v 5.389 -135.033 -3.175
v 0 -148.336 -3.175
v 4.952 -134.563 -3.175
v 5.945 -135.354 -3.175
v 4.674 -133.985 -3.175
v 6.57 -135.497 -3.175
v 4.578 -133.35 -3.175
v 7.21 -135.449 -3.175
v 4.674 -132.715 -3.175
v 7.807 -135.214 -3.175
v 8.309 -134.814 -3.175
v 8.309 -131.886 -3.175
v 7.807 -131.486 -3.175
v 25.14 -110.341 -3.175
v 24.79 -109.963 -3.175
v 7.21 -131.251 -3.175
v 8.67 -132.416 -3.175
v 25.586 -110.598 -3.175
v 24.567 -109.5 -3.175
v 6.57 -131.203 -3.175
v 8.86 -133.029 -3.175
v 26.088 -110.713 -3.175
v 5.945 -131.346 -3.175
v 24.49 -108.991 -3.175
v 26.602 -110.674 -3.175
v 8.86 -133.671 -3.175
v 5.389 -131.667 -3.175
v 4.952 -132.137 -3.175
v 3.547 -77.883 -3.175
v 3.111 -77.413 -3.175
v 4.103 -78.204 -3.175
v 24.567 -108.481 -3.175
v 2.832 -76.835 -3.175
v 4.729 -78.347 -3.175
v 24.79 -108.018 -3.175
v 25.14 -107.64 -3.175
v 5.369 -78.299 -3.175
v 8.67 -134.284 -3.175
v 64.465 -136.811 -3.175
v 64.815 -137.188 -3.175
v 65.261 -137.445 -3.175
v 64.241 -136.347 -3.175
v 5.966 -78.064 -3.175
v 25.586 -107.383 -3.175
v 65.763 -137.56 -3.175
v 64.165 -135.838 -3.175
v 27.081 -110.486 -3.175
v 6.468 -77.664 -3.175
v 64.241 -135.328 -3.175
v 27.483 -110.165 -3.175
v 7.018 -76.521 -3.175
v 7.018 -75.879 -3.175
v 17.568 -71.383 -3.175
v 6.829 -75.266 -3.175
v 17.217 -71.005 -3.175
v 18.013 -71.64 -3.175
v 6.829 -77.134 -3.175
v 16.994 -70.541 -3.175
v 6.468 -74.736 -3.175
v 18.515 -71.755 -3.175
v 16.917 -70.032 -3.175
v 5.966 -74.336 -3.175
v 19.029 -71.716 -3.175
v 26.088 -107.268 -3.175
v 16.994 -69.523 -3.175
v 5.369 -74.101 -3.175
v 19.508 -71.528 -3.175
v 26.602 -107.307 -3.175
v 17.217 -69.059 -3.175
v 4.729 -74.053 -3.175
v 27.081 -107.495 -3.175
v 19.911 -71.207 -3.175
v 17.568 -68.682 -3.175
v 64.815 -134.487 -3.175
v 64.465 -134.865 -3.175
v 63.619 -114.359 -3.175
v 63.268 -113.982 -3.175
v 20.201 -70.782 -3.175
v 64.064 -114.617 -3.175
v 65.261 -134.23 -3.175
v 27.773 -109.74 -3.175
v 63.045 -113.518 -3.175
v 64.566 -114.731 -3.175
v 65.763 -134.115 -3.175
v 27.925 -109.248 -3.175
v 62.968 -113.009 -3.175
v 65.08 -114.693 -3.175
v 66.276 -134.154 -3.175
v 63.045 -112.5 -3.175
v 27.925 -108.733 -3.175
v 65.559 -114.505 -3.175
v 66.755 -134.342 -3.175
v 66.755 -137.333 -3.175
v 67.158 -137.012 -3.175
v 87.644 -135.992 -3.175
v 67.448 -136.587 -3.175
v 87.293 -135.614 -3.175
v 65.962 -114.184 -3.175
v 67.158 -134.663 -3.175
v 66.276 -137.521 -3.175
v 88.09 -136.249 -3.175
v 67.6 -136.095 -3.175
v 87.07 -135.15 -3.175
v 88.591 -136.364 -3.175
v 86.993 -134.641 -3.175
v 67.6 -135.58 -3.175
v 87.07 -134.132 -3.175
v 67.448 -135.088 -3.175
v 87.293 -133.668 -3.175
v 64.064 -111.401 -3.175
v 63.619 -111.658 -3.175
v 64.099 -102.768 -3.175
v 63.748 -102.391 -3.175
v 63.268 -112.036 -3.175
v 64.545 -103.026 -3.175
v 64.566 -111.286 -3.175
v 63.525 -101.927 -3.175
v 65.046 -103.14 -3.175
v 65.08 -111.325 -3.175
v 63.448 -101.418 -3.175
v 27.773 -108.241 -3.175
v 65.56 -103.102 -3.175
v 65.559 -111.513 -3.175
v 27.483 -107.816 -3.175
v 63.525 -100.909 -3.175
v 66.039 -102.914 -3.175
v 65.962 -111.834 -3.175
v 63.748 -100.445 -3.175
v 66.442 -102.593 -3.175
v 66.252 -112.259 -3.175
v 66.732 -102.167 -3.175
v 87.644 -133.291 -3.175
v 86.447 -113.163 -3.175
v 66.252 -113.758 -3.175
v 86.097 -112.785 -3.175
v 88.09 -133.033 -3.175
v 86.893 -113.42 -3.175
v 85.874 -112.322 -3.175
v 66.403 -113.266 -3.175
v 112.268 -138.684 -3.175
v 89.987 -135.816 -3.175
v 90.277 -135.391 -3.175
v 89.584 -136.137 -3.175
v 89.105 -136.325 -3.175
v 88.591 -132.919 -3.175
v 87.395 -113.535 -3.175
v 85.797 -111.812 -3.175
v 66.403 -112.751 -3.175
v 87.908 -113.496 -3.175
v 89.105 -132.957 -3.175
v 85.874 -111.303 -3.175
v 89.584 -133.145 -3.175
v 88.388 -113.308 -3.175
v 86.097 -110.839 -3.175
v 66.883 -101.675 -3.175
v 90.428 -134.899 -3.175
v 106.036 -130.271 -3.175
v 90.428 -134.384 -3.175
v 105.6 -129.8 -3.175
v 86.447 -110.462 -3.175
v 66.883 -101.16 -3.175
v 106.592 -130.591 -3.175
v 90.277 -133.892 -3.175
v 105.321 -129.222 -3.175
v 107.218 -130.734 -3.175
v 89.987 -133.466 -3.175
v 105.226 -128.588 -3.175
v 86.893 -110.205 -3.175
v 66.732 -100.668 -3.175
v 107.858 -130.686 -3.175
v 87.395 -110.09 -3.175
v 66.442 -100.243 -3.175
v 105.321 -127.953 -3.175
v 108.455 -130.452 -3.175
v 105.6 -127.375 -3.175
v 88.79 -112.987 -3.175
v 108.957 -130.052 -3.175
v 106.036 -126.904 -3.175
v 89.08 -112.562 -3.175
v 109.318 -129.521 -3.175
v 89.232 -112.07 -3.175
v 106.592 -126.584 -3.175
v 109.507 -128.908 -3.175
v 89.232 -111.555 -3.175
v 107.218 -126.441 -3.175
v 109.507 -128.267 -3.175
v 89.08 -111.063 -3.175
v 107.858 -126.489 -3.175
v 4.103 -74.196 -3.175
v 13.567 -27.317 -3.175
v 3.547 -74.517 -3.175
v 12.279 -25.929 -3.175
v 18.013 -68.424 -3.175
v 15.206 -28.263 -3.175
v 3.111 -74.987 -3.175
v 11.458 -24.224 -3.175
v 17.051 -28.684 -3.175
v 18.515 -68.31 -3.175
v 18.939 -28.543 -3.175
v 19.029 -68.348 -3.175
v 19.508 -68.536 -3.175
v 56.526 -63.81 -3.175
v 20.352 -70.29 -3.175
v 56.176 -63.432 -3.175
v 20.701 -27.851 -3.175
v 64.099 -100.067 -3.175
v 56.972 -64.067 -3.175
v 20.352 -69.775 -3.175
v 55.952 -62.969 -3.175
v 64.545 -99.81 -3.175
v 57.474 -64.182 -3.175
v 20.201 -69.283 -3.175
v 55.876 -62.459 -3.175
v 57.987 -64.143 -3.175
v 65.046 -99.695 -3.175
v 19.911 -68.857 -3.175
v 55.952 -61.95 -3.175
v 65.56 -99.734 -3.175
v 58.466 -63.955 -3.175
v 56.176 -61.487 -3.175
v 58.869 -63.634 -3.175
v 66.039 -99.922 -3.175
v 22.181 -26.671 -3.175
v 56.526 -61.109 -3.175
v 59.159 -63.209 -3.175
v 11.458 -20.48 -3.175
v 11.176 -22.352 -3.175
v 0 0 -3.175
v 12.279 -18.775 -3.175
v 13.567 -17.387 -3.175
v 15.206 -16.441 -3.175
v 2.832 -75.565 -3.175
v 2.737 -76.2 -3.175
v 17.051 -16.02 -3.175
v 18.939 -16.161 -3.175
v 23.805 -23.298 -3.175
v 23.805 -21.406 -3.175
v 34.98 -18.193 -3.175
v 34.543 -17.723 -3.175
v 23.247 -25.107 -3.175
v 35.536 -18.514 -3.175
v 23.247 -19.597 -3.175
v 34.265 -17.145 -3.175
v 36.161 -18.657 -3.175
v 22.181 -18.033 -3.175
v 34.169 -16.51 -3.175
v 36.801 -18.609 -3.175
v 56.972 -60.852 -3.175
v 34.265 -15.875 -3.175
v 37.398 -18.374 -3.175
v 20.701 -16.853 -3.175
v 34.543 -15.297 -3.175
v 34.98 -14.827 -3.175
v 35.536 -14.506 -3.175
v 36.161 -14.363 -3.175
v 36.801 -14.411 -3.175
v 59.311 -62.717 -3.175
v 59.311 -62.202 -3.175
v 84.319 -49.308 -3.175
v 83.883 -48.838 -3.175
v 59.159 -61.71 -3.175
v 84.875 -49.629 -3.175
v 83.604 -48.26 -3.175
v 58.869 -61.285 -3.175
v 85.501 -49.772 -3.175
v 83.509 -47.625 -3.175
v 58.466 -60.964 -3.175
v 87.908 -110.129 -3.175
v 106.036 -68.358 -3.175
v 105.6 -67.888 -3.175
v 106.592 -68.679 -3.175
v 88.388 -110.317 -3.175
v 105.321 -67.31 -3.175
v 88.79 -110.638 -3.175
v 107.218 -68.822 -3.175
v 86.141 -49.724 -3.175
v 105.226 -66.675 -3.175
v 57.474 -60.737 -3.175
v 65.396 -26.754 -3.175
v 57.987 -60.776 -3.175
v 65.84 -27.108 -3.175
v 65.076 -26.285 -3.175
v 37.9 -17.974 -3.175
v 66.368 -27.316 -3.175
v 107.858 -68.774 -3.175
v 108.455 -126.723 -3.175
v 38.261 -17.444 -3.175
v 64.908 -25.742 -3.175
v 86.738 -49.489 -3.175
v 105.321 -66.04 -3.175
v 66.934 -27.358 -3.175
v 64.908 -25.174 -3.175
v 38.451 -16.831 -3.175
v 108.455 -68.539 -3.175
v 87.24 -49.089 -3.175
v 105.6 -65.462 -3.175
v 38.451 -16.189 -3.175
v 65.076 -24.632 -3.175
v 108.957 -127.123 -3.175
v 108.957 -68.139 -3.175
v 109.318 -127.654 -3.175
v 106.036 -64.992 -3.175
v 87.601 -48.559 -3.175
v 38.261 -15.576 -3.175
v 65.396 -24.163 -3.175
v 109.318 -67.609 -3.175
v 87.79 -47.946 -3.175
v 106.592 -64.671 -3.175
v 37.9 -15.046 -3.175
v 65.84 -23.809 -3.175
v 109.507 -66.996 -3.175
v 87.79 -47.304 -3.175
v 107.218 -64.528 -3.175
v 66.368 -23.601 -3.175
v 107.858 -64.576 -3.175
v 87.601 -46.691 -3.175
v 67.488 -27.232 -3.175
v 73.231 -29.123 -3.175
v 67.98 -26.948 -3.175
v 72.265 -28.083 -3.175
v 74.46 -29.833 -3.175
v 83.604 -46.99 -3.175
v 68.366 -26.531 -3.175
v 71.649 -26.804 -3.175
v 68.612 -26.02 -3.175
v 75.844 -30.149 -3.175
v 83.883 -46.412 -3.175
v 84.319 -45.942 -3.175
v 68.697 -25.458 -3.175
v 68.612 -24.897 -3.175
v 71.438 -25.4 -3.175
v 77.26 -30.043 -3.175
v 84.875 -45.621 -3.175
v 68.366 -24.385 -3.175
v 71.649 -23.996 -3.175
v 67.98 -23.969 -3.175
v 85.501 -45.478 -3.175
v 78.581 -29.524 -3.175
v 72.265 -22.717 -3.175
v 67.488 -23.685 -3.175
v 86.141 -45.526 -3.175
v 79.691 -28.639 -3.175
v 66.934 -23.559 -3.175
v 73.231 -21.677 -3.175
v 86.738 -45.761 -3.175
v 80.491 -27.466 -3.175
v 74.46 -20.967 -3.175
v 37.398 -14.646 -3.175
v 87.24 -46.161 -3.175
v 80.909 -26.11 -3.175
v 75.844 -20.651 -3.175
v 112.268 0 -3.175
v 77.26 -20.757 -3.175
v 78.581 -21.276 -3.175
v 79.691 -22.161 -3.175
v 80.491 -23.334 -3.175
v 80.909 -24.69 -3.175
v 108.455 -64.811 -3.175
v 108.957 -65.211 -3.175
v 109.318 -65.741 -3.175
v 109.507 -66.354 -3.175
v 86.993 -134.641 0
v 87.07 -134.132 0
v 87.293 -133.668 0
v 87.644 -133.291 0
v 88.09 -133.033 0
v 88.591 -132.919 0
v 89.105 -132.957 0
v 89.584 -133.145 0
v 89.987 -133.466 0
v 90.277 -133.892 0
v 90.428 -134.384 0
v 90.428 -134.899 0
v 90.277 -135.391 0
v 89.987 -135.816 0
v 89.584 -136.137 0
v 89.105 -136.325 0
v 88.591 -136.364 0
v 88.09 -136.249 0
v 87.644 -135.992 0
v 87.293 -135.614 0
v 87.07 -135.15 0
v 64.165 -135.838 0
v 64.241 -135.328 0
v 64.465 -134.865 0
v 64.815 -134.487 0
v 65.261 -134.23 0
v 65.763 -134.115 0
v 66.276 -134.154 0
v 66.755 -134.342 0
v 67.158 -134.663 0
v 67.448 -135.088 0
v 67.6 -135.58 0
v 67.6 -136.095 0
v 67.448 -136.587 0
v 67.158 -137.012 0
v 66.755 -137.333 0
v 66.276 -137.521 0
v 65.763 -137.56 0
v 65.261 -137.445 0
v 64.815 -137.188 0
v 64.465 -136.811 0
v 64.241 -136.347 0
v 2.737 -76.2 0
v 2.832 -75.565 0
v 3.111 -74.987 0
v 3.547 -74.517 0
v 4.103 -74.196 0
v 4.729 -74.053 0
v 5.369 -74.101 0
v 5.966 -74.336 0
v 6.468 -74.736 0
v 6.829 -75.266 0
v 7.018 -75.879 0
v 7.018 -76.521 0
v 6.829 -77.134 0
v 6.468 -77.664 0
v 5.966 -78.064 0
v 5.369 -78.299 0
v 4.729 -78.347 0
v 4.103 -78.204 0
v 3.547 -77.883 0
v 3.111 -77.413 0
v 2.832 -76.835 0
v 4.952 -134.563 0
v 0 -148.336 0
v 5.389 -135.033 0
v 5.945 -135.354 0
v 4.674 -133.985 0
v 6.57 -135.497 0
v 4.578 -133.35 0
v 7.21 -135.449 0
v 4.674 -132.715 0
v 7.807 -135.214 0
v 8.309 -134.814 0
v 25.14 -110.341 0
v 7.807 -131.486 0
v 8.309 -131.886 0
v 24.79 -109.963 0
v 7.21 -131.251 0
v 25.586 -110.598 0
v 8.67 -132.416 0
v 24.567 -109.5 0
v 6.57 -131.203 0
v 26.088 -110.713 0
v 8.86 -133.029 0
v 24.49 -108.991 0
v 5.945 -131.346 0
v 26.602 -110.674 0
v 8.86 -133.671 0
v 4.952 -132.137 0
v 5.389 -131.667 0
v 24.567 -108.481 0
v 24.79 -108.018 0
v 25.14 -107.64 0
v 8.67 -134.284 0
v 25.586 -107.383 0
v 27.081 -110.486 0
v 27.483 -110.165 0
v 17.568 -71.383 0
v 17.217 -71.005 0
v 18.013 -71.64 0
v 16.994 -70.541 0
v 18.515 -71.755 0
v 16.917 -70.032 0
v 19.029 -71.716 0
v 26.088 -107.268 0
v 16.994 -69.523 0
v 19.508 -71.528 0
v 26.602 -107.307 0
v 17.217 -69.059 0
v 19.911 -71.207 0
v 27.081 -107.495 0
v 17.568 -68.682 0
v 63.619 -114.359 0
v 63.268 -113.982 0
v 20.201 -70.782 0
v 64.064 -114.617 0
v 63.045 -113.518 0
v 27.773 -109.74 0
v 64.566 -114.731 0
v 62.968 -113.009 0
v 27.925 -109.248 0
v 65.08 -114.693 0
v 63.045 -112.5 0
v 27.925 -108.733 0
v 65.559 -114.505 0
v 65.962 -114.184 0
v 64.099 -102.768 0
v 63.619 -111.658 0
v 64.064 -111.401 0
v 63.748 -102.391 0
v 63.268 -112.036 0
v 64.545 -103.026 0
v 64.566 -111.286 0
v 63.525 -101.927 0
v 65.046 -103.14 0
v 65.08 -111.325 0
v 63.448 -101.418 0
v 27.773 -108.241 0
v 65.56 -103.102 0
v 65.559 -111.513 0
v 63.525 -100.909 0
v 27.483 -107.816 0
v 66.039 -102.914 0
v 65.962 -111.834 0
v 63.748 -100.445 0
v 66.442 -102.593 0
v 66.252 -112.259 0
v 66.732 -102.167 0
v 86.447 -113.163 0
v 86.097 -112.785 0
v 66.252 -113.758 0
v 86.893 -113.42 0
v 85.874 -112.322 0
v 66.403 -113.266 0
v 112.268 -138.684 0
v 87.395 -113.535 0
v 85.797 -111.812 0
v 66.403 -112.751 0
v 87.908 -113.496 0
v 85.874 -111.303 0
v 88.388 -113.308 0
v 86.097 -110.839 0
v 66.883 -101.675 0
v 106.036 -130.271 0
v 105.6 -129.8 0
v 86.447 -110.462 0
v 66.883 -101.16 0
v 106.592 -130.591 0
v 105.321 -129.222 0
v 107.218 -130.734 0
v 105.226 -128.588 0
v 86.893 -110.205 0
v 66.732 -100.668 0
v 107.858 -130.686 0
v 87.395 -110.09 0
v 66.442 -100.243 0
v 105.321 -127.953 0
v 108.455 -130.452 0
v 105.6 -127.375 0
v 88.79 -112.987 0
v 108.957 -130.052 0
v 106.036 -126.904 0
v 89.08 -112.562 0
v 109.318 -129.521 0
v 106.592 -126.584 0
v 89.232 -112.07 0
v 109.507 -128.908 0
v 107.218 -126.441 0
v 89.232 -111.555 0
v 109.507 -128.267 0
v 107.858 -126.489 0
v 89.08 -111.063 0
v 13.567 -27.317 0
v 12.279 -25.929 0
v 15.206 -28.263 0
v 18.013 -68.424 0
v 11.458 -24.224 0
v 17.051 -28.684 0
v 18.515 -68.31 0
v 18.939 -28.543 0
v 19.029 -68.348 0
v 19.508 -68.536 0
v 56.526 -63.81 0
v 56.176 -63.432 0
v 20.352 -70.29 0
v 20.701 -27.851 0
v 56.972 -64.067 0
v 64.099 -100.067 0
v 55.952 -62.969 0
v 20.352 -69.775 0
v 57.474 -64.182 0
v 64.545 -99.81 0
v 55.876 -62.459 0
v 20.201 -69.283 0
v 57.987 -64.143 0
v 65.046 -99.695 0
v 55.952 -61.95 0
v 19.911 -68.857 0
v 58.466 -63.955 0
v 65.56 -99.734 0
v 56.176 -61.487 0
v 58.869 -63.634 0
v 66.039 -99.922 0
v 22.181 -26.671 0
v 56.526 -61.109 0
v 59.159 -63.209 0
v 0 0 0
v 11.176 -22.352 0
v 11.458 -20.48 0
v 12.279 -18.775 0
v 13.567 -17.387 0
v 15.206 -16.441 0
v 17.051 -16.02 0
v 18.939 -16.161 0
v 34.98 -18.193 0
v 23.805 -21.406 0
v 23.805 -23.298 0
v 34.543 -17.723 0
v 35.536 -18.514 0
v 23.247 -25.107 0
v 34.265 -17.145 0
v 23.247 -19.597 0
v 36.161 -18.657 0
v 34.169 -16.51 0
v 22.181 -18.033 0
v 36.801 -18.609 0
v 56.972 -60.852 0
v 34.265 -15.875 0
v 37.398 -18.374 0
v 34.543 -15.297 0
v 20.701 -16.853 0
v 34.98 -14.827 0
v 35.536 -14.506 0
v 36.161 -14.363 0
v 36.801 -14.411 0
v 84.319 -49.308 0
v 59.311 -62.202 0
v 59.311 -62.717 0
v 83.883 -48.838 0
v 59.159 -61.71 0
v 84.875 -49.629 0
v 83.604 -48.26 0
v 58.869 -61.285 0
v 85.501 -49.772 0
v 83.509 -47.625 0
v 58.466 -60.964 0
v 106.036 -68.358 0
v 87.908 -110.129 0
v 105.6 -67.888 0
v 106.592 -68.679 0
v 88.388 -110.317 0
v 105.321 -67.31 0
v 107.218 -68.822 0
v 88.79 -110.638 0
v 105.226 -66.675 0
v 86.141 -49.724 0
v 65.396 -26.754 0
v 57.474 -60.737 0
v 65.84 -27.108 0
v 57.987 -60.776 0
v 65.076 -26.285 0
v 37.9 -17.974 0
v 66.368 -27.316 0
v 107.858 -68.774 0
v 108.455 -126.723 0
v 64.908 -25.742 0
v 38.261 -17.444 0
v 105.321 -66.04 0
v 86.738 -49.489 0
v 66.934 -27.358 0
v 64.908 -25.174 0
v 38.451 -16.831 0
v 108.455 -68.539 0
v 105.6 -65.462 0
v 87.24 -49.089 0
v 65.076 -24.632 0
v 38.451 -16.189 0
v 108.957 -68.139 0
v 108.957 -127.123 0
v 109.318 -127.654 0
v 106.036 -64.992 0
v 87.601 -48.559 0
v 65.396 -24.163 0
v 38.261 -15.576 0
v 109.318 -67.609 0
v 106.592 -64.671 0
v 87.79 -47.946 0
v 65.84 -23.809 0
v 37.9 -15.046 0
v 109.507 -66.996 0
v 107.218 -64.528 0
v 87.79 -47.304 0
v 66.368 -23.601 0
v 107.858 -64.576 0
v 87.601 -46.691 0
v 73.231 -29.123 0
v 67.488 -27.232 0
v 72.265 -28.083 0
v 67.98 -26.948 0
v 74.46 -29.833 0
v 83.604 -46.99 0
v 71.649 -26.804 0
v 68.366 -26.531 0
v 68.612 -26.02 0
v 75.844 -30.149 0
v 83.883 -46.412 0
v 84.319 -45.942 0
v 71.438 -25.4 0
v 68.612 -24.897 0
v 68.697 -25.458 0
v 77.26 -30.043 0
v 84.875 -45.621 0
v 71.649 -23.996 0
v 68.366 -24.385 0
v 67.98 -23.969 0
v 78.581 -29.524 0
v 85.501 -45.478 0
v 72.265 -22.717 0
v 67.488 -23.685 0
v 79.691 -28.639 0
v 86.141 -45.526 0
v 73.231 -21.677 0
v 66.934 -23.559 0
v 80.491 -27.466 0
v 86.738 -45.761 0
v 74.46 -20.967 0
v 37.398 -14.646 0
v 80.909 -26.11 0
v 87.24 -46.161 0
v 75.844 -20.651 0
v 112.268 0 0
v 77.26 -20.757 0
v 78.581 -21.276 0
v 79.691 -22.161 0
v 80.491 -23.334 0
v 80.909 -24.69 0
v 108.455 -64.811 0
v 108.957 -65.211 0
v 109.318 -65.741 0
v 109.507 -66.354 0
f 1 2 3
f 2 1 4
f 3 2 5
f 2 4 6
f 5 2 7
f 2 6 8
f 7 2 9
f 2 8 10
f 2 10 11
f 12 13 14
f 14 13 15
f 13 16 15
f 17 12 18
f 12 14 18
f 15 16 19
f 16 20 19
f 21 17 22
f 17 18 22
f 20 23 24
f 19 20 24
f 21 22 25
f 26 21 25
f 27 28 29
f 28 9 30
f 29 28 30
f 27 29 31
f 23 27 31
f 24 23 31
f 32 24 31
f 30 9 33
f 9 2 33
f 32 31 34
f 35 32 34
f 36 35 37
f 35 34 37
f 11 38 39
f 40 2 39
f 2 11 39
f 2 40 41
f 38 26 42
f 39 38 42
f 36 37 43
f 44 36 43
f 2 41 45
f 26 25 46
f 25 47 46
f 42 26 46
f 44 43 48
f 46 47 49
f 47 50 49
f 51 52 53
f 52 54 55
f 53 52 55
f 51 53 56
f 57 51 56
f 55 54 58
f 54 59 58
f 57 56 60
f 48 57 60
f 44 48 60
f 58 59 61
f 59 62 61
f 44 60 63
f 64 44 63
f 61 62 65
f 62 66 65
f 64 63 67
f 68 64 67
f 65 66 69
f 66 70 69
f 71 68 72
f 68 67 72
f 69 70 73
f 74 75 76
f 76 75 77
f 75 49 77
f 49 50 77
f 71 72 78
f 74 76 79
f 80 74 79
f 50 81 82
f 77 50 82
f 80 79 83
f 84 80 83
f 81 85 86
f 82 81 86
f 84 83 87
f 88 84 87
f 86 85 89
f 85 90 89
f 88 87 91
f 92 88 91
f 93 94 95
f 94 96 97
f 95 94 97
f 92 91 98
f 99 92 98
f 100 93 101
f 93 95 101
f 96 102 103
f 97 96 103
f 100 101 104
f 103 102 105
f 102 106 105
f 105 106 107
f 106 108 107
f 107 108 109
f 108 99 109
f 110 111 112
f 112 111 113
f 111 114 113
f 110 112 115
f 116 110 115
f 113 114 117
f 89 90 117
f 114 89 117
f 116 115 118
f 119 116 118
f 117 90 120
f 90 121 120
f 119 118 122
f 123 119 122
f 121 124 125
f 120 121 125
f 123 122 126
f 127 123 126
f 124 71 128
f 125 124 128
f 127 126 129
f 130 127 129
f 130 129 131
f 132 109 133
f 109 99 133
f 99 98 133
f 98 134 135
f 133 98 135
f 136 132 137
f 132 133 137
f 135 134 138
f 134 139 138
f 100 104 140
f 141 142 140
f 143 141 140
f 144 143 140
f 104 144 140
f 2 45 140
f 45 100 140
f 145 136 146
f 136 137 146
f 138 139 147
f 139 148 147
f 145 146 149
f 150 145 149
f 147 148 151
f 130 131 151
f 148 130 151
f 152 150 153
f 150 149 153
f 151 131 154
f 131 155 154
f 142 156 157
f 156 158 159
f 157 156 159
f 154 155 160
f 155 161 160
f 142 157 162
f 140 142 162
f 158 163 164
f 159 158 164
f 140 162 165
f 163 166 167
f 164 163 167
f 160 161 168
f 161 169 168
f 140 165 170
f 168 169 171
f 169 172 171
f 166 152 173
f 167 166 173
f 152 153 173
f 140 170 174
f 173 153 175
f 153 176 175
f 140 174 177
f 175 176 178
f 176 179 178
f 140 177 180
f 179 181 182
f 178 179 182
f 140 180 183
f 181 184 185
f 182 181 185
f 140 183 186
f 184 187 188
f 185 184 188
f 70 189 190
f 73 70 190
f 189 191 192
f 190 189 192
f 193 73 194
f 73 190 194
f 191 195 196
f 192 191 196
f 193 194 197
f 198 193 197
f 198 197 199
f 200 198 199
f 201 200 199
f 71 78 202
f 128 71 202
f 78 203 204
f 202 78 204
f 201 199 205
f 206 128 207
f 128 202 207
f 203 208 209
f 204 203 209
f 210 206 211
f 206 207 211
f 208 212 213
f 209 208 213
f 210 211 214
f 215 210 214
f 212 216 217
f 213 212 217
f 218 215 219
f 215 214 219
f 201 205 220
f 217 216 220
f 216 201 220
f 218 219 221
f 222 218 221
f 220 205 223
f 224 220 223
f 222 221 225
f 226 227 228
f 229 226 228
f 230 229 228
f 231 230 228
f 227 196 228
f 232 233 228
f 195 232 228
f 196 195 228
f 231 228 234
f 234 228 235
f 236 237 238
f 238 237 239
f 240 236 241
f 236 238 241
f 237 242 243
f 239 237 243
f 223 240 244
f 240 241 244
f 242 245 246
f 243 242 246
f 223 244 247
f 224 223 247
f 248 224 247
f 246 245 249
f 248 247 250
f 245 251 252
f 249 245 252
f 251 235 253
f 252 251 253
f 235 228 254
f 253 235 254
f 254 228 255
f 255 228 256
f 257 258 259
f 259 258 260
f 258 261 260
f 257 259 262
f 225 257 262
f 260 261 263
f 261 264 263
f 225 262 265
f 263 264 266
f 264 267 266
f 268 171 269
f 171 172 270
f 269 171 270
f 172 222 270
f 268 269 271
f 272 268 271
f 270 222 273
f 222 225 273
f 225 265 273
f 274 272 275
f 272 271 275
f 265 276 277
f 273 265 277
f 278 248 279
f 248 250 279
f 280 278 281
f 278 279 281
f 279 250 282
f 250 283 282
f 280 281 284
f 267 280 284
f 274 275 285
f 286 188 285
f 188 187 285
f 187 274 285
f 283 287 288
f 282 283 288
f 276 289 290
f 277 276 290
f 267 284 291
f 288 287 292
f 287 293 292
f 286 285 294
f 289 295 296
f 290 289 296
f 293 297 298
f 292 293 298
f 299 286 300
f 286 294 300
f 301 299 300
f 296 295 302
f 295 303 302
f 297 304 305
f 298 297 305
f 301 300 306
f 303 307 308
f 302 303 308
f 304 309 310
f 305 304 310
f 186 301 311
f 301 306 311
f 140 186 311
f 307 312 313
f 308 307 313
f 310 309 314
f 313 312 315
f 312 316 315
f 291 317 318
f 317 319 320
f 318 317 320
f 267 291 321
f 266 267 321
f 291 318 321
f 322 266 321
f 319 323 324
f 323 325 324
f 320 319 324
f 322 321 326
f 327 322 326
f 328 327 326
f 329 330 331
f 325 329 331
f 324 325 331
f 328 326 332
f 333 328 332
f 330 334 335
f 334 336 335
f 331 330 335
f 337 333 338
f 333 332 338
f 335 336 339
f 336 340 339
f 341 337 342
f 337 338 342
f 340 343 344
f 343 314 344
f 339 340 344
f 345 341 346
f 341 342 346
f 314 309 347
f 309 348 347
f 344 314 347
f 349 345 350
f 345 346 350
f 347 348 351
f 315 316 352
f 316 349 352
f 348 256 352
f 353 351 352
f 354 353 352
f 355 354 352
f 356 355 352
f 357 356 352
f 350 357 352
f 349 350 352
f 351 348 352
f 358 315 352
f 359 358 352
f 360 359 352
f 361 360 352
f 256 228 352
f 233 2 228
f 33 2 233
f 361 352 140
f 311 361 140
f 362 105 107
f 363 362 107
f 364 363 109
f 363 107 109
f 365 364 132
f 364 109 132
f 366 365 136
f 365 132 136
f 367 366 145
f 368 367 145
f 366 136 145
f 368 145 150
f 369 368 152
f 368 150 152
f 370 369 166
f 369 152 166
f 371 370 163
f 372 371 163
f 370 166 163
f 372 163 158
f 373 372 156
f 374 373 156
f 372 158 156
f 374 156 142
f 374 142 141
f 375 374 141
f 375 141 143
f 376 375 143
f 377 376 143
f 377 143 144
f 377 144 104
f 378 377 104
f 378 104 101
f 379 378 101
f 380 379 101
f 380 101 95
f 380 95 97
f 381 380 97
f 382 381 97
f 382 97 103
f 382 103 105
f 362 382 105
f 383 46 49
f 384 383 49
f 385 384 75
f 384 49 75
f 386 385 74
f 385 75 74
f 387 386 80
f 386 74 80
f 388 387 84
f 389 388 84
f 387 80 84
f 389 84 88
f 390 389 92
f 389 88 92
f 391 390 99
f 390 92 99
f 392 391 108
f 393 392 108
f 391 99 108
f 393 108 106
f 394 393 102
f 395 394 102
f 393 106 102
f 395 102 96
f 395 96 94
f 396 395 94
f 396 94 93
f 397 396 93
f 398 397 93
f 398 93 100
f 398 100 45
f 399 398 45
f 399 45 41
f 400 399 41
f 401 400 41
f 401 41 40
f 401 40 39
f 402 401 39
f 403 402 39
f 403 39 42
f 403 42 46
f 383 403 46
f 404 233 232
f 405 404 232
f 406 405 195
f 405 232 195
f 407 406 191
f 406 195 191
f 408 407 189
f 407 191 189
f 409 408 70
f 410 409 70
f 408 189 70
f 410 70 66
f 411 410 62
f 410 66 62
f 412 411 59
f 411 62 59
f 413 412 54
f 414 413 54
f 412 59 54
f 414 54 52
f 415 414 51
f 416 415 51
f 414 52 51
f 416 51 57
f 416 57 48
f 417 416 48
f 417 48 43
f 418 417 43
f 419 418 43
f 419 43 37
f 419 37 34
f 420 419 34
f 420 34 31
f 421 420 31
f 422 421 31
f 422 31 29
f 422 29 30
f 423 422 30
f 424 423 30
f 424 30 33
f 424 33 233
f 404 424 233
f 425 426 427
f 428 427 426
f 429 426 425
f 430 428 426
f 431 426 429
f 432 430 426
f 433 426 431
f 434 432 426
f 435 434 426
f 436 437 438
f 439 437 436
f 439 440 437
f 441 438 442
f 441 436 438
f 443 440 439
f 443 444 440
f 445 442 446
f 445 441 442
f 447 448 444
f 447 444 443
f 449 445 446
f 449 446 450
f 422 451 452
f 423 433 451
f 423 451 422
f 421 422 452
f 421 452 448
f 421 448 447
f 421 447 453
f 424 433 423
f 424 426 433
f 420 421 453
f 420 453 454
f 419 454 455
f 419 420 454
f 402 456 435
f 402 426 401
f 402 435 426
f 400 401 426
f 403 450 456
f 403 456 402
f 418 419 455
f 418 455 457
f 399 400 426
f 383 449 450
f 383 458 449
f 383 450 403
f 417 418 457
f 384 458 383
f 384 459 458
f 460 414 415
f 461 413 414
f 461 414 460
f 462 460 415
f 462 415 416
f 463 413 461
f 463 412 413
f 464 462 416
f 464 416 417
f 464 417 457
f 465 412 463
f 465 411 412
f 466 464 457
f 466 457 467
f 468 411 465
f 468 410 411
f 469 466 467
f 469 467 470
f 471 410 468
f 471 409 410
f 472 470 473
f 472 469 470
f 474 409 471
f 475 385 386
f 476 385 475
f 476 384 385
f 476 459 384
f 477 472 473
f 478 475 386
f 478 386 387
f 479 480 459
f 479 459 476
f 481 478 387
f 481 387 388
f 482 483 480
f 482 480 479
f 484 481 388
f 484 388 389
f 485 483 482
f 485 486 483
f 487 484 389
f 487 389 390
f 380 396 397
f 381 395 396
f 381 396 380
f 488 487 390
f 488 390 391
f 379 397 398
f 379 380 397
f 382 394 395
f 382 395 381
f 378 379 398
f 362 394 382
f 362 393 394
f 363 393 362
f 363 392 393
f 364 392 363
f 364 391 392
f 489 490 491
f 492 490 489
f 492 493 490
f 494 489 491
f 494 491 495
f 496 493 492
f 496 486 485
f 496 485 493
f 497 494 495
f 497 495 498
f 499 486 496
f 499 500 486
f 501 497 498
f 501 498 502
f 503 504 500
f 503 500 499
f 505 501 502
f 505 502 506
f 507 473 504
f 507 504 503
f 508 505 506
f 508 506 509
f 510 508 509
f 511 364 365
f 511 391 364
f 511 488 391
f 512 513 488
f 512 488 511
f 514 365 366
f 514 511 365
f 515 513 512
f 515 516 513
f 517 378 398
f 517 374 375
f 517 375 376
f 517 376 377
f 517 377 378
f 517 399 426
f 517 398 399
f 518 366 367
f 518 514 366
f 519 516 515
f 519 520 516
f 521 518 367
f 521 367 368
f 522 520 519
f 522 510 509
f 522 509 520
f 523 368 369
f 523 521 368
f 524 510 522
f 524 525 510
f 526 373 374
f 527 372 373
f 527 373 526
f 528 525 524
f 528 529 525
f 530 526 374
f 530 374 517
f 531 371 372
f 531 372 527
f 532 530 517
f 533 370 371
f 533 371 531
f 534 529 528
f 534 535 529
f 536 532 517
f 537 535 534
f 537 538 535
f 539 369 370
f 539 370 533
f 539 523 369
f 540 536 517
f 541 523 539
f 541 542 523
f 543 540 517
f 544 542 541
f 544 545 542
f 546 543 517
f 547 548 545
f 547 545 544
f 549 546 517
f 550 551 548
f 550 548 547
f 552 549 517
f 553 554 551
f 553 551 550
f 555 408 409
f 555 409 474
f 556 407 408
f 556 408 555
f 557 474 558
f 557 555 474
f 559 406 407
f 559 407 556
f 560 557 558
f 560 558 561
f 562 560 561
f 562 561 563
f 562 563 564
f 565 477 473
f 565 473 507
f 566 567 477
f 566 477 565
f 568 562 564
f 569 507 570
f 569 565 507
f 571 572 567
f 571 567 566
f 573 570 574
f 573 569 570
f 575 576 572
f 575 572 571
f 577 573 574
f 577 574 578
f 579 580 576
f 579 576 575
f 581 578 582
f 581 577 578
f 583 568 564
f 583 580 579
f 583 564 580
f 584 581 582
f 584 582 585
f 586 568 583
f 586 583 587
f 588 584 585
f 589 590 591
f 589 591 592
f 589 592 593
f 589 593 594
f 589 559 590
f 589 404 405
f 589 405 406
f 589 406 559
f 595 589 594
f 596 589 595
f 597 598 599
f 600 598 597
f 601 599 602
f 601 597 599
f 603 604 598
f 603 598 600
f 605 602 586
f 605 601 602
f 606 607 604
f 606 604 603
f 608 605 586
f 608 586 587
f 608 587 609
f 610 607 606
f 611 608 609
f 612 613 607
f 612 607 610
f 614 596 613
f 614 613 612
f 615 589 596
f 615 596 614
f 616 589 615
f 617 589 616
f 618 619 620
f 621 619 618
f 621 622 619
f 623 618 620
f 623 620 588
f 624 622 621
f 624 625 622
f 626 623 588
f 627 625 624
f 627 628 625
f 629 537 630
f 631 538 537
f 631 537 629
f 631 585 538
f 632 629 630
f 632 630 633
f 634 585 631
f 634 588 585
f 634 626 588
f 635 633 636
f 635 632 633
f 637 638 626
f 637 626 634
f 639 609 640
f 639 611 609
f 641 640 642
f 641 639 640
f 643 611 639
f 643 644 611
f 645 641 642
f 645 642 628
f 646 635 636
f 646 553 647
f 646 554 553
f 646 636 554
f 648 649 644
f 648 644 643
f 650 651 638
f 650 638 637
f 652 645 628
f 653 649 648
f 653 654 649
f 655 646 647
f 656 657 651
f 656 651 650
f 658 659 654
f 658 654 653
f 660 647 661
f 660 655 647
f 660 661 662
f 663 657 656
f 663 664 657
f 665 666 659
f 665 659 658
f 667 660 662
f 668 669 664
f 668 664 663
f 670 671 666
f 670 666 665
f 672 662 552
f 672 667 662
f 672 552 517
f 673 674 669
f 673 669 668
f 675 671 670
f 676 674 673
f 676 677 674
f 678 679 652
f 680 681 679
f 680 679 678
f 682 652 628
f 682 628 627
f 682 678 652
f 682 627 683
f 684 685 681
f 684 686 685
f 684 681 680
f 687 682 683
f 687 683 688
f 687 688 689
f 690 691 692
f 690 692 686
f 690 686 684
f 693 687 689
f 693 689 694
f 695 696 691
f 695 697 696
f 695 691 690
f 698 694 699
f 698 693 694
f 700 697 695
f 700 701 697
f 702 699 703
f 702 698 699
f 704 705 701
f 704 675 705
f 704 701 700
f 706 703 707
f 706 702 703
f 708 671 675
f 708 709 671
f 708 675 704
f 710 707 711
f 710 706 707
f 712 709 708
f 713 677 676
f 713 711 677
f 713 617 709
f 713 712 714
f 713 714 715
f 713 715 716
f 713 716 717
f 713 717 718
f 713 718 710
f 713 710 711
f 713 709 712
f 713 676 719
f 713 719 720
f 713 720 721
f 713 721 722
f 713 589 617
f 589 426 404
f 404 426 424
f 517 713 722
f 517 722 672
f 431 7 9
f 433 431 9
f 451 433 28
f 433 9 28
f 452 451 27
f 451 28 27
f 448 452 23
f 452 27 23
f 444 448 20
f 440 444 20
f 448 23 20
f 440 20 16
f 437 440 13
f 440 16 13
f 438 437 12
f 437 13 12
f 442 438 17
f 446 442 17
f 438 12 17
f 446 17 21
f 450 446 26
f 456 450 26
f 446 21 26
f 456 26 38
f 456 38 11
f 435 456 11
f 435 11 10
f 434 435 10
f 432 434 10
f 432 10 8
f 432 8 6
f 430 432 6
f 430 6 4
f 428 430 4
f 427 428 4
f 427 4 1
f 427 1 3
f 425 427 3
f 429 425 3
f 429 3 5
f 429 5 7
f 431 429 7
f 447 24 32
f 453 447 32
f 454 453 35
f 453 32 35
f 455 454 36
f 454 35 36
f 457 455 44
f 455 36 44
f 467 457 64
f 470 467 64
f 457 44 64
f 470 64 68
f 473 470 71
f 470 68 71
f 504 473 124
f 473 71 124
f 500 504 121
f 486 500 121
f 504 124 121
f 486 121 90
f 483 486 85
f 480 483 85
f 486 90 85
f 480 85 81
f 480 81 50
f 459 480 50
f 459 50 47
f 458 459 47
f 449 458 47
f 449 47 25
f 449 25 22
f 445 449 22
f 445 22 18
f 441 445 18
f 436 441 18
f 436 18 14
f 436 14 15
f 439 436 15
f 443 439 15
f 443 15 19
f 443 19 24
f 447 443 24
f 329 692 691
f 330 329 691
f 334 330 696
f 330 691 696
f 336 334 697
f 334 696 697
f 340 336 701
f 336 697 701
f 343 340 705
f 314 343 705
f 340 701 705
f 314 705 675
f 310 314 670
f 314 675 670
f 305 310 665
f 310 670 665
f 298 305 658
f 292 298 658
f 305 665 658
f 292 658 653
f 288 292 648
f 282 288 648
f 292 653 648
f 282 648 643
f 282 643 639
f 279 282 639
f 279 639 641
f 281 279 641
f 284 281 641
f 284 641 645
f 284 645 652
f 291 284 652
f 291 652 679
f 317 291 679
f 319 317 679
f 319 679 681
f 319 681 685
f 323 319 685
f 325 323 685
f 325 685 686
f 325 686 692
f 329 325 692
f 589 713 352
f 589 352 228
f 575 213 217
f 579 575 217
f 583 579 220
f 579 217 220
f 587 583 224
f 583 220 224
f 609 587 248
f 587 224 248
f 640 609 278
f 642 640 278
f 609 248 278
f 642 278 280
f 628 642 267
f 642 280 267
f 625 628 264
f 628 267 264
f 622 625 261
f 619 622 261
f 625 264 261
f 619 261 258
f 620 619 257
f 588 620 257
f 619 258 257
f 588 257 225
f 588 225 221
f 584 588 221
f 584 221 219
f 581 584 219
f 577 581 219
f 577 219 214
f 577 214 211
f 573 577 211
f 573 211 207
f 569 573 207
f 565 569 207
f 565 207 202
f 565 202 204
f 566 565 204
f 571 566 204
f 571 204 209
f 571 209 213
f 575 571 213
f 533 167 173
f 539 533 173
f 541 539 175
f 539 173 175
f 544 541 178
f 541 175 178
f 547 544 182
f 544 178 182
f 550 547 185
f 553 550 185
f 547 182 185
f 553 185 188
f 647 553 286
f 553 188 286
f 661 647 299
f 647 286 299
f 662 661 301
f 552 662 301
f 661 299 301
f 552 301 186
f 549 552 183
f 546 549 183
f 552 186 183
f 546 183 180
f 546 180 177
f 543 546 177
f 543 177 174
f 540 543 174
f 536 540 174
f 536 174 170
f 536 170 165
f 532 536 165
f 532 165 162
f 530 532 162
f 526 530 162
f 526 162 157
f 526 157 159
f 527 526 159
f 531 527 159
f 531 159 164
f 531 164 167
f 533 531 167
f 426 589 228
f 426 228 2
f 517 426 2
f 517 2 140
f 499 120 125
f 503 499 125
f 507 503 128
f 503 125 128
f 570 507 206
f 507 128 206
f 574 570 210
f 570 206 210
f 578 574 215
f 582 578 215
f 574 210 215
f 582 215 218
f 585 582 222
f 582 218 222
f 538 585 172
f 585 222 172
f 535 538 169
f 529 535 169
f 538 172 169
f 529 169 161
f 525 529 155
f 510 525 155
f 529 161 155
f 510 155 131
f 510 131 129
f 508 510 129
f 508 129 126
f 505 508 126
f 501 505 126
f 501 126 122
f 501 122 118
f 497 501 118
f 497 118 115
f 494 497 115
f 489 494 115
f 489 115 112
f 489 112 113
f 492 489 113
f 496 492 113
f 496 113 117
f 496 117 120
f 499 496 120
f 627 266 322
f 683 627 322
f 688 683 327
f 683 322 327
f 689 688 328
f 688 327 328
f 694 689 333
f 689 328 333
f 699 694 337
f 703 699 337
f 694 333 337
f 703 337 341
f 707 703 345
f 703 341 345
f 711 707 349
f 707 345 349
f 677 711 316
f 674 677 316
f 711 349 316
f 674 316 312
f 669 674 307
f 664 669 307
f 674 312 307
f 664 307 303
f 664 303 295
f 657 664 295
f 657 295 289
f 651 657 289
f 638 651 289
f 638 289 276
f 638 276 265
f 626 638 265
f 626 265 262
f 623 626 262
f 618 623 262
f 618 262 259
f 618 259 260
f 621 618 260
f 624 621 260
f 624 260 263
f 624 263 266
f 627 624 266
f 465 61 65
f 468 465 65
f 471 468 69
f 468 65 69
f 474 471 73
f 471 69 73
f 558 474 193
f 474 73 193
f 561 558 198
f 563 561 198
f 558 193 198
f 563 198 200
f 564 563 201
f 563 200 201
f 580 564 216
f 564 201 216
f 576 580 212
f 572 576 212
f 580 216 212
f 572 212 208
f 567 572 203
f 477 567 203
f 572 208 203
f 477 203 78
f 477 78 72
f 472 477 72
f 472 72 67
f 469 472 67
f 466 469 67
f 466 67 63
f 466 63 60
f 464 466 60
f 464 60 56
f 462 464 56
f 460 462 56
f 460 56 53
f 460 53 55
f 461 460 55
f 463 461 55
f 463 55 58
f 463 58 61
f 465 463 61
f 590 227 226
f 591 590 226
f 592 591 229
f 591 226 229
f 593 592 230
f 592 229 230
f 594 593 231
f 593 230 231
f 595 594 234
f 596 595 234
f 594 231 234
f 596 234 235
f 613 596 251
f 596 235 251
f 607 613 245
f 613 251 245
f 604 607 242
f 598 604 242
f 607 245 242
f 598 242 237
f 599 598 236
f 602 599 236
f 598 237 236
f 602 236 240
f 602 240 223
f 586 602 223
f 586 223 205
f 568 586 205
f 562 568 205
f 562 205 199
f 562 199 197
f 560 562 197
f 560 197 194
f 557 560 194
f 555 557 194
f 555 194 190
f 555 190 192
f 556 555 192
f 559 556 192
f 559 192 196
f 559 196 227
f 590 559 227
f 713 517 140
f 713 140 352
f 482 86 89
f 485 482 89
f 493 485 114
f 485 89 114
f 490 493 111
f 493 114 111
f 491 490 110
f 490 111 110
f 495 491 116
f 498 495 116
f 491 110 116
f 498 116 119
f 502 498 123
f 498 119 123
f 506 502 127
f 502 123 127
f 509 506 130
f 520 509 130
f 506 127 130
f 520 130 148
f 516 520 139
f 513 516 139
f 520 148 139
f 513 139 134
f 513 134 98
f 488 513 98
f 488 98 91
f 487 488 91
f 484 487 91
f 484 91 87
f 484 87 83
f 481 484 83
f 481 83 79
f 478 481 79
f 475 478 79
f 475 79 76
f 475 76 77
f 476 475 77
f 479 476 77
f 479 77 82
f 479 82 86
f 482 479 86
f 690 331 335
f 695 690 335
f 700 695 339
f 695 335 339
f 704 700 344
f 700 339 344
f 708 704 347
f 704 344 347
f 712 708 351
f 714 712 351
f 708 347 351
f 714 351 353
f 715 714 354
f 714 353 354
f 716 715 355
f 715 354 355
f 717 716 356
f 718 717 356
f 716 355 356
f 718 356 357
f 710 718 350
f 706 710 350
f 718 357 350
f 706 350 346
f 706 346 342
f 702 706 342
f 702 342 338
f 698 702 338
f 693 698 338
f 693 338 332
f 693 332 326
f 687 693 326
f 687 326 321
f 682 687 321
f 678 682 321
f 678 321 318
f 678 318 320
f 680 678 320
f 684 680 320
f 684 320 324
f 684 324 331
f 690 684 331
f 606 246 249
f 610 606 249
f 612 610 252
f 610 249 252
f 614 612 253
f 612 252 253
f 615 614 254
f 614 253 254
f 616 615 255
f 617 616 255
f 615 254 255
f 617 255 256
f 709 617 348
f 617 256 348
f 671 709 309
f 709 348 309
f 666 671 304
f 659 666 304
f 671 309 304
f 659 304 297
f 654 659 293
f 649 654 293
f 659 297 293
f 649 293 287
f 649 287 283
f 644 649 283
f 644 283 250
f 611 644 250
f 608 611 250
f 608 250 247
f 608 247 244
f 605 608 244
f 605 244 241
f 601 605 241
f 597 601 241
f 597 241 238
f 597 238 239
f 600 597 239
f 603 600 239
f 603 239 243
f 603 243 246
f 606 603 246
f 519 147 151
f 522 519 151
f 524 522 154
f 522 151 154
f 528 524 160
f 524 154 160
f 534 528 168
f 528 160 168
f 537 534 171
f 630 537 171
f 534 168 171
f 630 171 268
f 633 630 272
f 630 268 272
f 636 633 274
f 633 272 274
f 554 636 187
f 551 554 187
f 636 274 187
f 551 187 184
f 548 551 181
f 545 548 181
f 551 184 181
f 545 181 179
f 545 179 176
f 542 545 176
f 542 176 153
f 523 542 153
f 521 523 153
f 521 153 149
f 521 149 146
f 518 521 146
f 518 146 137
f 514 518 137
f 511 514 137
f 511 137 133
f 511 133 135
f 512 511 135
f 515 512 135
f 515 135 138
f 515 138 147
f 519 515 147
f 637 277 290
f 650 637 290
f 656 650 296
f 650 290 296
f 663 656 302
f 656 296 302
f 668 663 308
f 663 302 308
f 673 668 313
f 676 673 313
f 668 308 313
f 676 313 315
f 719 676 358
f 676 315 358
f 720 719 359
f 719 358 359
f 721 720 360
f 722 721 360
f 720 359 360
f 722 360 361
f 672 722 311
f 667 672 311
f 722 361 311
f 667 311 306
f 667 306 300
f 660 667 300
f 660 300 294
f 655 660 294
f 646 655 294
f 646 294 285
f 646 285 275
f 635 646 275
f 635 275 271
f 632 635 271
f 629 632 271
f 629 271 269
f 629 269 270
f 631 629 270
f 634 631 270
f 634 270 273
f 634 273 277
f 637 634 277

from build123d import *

# Parameters (mm, degrees)
BOSS_EXTRUDE1_DEPTH               = 3.175
F_6_CLEARANCE_HOLE1_D             = 4.3053
F_4_CLEARANCE_HOLE1_D             = 3.4544
F_6_CLEARANCE_HOLE2_D             = 4.3053
F_3_8_0_375_DIAMETER_HOLE1_D      = 9.525
F_1_2_0_5_DIAMETER_HOLE1_D        = 12.7
OBOGS_ROTARY_ANTI_ROTATION_HOLE_D = 3.81


with BuildPart() as part:
    # Sketch1 → Boss-Extrude1 (new body)
    with BuildSketch(Plane.XY):
        Polygon((112.268, 0), (0, 0), (0, -148.336), (112.268, -138.684), align=None)
    extrude(amount=-BOSS_EXTRUDE1_DEPTH)

    # #6 Clearance Hole1 (through all)
    with Locations(Plane.XY):
        with Locations((6.731, -133.35), (107.3785, -128.5875), (107.3785, -66.675), (4.8895, -76.2)):
            Hole(F_6_CLEARANCE_HOLE1_D / 2)

    # #4 Clearance Hole1 (through all)
    with Locations(Plane.XY):
        with Locations((18.644469576, -70.03220158), (57.60279842, -62.459469576), (65.175530424, -101.41779842), (26.21720158, -108.990530424), (65.891864398, -135.837535562), (88.720535562, -134.641135602), (87.524135602, -111.812464438), (64.695464438, -113.008864398)):
            Hole(F_4_CLEARANCE_HOLE1_D / 2)

    # #6 Clearance Hole2 (through all)
    with Locations(Plane.XY):
        with Locations((36.322, -16.51), (85.6615, -47.625)):
            Hole(F_6_CLEARANCE_HOLE2_D / 2)

    # 3/8 (0.375) Diameter Hole1 (through all)
    with Locations(Plane.XY):
        with Locations((76.2, -25.4)):
            Hole(F_3_8_0_375_DIAMETER_HOLE1_D / 2)

    # 1/2 (0.5) Diameter Hole1 (through all)
    with Locations(Plane.XY):
        with Locations((17.526, -22.352)):
            Hole(F_1_2_0_5_DIAMETER_HOLE1_D / 2)

    # OBOGS Rotary Anti Rotation Hole (through all)
    with Locations(Plane(origin=(0, 0, -3.175), x_dir=(-1, 0, 0), z_dir=(0, 0, -1))):
        with Locations((-66.792027829, -25.458354734)):
            Hole(OBOGS_ROTARY_ANTI_ROTATION_HOLE_D / 2)


solid = part.part
